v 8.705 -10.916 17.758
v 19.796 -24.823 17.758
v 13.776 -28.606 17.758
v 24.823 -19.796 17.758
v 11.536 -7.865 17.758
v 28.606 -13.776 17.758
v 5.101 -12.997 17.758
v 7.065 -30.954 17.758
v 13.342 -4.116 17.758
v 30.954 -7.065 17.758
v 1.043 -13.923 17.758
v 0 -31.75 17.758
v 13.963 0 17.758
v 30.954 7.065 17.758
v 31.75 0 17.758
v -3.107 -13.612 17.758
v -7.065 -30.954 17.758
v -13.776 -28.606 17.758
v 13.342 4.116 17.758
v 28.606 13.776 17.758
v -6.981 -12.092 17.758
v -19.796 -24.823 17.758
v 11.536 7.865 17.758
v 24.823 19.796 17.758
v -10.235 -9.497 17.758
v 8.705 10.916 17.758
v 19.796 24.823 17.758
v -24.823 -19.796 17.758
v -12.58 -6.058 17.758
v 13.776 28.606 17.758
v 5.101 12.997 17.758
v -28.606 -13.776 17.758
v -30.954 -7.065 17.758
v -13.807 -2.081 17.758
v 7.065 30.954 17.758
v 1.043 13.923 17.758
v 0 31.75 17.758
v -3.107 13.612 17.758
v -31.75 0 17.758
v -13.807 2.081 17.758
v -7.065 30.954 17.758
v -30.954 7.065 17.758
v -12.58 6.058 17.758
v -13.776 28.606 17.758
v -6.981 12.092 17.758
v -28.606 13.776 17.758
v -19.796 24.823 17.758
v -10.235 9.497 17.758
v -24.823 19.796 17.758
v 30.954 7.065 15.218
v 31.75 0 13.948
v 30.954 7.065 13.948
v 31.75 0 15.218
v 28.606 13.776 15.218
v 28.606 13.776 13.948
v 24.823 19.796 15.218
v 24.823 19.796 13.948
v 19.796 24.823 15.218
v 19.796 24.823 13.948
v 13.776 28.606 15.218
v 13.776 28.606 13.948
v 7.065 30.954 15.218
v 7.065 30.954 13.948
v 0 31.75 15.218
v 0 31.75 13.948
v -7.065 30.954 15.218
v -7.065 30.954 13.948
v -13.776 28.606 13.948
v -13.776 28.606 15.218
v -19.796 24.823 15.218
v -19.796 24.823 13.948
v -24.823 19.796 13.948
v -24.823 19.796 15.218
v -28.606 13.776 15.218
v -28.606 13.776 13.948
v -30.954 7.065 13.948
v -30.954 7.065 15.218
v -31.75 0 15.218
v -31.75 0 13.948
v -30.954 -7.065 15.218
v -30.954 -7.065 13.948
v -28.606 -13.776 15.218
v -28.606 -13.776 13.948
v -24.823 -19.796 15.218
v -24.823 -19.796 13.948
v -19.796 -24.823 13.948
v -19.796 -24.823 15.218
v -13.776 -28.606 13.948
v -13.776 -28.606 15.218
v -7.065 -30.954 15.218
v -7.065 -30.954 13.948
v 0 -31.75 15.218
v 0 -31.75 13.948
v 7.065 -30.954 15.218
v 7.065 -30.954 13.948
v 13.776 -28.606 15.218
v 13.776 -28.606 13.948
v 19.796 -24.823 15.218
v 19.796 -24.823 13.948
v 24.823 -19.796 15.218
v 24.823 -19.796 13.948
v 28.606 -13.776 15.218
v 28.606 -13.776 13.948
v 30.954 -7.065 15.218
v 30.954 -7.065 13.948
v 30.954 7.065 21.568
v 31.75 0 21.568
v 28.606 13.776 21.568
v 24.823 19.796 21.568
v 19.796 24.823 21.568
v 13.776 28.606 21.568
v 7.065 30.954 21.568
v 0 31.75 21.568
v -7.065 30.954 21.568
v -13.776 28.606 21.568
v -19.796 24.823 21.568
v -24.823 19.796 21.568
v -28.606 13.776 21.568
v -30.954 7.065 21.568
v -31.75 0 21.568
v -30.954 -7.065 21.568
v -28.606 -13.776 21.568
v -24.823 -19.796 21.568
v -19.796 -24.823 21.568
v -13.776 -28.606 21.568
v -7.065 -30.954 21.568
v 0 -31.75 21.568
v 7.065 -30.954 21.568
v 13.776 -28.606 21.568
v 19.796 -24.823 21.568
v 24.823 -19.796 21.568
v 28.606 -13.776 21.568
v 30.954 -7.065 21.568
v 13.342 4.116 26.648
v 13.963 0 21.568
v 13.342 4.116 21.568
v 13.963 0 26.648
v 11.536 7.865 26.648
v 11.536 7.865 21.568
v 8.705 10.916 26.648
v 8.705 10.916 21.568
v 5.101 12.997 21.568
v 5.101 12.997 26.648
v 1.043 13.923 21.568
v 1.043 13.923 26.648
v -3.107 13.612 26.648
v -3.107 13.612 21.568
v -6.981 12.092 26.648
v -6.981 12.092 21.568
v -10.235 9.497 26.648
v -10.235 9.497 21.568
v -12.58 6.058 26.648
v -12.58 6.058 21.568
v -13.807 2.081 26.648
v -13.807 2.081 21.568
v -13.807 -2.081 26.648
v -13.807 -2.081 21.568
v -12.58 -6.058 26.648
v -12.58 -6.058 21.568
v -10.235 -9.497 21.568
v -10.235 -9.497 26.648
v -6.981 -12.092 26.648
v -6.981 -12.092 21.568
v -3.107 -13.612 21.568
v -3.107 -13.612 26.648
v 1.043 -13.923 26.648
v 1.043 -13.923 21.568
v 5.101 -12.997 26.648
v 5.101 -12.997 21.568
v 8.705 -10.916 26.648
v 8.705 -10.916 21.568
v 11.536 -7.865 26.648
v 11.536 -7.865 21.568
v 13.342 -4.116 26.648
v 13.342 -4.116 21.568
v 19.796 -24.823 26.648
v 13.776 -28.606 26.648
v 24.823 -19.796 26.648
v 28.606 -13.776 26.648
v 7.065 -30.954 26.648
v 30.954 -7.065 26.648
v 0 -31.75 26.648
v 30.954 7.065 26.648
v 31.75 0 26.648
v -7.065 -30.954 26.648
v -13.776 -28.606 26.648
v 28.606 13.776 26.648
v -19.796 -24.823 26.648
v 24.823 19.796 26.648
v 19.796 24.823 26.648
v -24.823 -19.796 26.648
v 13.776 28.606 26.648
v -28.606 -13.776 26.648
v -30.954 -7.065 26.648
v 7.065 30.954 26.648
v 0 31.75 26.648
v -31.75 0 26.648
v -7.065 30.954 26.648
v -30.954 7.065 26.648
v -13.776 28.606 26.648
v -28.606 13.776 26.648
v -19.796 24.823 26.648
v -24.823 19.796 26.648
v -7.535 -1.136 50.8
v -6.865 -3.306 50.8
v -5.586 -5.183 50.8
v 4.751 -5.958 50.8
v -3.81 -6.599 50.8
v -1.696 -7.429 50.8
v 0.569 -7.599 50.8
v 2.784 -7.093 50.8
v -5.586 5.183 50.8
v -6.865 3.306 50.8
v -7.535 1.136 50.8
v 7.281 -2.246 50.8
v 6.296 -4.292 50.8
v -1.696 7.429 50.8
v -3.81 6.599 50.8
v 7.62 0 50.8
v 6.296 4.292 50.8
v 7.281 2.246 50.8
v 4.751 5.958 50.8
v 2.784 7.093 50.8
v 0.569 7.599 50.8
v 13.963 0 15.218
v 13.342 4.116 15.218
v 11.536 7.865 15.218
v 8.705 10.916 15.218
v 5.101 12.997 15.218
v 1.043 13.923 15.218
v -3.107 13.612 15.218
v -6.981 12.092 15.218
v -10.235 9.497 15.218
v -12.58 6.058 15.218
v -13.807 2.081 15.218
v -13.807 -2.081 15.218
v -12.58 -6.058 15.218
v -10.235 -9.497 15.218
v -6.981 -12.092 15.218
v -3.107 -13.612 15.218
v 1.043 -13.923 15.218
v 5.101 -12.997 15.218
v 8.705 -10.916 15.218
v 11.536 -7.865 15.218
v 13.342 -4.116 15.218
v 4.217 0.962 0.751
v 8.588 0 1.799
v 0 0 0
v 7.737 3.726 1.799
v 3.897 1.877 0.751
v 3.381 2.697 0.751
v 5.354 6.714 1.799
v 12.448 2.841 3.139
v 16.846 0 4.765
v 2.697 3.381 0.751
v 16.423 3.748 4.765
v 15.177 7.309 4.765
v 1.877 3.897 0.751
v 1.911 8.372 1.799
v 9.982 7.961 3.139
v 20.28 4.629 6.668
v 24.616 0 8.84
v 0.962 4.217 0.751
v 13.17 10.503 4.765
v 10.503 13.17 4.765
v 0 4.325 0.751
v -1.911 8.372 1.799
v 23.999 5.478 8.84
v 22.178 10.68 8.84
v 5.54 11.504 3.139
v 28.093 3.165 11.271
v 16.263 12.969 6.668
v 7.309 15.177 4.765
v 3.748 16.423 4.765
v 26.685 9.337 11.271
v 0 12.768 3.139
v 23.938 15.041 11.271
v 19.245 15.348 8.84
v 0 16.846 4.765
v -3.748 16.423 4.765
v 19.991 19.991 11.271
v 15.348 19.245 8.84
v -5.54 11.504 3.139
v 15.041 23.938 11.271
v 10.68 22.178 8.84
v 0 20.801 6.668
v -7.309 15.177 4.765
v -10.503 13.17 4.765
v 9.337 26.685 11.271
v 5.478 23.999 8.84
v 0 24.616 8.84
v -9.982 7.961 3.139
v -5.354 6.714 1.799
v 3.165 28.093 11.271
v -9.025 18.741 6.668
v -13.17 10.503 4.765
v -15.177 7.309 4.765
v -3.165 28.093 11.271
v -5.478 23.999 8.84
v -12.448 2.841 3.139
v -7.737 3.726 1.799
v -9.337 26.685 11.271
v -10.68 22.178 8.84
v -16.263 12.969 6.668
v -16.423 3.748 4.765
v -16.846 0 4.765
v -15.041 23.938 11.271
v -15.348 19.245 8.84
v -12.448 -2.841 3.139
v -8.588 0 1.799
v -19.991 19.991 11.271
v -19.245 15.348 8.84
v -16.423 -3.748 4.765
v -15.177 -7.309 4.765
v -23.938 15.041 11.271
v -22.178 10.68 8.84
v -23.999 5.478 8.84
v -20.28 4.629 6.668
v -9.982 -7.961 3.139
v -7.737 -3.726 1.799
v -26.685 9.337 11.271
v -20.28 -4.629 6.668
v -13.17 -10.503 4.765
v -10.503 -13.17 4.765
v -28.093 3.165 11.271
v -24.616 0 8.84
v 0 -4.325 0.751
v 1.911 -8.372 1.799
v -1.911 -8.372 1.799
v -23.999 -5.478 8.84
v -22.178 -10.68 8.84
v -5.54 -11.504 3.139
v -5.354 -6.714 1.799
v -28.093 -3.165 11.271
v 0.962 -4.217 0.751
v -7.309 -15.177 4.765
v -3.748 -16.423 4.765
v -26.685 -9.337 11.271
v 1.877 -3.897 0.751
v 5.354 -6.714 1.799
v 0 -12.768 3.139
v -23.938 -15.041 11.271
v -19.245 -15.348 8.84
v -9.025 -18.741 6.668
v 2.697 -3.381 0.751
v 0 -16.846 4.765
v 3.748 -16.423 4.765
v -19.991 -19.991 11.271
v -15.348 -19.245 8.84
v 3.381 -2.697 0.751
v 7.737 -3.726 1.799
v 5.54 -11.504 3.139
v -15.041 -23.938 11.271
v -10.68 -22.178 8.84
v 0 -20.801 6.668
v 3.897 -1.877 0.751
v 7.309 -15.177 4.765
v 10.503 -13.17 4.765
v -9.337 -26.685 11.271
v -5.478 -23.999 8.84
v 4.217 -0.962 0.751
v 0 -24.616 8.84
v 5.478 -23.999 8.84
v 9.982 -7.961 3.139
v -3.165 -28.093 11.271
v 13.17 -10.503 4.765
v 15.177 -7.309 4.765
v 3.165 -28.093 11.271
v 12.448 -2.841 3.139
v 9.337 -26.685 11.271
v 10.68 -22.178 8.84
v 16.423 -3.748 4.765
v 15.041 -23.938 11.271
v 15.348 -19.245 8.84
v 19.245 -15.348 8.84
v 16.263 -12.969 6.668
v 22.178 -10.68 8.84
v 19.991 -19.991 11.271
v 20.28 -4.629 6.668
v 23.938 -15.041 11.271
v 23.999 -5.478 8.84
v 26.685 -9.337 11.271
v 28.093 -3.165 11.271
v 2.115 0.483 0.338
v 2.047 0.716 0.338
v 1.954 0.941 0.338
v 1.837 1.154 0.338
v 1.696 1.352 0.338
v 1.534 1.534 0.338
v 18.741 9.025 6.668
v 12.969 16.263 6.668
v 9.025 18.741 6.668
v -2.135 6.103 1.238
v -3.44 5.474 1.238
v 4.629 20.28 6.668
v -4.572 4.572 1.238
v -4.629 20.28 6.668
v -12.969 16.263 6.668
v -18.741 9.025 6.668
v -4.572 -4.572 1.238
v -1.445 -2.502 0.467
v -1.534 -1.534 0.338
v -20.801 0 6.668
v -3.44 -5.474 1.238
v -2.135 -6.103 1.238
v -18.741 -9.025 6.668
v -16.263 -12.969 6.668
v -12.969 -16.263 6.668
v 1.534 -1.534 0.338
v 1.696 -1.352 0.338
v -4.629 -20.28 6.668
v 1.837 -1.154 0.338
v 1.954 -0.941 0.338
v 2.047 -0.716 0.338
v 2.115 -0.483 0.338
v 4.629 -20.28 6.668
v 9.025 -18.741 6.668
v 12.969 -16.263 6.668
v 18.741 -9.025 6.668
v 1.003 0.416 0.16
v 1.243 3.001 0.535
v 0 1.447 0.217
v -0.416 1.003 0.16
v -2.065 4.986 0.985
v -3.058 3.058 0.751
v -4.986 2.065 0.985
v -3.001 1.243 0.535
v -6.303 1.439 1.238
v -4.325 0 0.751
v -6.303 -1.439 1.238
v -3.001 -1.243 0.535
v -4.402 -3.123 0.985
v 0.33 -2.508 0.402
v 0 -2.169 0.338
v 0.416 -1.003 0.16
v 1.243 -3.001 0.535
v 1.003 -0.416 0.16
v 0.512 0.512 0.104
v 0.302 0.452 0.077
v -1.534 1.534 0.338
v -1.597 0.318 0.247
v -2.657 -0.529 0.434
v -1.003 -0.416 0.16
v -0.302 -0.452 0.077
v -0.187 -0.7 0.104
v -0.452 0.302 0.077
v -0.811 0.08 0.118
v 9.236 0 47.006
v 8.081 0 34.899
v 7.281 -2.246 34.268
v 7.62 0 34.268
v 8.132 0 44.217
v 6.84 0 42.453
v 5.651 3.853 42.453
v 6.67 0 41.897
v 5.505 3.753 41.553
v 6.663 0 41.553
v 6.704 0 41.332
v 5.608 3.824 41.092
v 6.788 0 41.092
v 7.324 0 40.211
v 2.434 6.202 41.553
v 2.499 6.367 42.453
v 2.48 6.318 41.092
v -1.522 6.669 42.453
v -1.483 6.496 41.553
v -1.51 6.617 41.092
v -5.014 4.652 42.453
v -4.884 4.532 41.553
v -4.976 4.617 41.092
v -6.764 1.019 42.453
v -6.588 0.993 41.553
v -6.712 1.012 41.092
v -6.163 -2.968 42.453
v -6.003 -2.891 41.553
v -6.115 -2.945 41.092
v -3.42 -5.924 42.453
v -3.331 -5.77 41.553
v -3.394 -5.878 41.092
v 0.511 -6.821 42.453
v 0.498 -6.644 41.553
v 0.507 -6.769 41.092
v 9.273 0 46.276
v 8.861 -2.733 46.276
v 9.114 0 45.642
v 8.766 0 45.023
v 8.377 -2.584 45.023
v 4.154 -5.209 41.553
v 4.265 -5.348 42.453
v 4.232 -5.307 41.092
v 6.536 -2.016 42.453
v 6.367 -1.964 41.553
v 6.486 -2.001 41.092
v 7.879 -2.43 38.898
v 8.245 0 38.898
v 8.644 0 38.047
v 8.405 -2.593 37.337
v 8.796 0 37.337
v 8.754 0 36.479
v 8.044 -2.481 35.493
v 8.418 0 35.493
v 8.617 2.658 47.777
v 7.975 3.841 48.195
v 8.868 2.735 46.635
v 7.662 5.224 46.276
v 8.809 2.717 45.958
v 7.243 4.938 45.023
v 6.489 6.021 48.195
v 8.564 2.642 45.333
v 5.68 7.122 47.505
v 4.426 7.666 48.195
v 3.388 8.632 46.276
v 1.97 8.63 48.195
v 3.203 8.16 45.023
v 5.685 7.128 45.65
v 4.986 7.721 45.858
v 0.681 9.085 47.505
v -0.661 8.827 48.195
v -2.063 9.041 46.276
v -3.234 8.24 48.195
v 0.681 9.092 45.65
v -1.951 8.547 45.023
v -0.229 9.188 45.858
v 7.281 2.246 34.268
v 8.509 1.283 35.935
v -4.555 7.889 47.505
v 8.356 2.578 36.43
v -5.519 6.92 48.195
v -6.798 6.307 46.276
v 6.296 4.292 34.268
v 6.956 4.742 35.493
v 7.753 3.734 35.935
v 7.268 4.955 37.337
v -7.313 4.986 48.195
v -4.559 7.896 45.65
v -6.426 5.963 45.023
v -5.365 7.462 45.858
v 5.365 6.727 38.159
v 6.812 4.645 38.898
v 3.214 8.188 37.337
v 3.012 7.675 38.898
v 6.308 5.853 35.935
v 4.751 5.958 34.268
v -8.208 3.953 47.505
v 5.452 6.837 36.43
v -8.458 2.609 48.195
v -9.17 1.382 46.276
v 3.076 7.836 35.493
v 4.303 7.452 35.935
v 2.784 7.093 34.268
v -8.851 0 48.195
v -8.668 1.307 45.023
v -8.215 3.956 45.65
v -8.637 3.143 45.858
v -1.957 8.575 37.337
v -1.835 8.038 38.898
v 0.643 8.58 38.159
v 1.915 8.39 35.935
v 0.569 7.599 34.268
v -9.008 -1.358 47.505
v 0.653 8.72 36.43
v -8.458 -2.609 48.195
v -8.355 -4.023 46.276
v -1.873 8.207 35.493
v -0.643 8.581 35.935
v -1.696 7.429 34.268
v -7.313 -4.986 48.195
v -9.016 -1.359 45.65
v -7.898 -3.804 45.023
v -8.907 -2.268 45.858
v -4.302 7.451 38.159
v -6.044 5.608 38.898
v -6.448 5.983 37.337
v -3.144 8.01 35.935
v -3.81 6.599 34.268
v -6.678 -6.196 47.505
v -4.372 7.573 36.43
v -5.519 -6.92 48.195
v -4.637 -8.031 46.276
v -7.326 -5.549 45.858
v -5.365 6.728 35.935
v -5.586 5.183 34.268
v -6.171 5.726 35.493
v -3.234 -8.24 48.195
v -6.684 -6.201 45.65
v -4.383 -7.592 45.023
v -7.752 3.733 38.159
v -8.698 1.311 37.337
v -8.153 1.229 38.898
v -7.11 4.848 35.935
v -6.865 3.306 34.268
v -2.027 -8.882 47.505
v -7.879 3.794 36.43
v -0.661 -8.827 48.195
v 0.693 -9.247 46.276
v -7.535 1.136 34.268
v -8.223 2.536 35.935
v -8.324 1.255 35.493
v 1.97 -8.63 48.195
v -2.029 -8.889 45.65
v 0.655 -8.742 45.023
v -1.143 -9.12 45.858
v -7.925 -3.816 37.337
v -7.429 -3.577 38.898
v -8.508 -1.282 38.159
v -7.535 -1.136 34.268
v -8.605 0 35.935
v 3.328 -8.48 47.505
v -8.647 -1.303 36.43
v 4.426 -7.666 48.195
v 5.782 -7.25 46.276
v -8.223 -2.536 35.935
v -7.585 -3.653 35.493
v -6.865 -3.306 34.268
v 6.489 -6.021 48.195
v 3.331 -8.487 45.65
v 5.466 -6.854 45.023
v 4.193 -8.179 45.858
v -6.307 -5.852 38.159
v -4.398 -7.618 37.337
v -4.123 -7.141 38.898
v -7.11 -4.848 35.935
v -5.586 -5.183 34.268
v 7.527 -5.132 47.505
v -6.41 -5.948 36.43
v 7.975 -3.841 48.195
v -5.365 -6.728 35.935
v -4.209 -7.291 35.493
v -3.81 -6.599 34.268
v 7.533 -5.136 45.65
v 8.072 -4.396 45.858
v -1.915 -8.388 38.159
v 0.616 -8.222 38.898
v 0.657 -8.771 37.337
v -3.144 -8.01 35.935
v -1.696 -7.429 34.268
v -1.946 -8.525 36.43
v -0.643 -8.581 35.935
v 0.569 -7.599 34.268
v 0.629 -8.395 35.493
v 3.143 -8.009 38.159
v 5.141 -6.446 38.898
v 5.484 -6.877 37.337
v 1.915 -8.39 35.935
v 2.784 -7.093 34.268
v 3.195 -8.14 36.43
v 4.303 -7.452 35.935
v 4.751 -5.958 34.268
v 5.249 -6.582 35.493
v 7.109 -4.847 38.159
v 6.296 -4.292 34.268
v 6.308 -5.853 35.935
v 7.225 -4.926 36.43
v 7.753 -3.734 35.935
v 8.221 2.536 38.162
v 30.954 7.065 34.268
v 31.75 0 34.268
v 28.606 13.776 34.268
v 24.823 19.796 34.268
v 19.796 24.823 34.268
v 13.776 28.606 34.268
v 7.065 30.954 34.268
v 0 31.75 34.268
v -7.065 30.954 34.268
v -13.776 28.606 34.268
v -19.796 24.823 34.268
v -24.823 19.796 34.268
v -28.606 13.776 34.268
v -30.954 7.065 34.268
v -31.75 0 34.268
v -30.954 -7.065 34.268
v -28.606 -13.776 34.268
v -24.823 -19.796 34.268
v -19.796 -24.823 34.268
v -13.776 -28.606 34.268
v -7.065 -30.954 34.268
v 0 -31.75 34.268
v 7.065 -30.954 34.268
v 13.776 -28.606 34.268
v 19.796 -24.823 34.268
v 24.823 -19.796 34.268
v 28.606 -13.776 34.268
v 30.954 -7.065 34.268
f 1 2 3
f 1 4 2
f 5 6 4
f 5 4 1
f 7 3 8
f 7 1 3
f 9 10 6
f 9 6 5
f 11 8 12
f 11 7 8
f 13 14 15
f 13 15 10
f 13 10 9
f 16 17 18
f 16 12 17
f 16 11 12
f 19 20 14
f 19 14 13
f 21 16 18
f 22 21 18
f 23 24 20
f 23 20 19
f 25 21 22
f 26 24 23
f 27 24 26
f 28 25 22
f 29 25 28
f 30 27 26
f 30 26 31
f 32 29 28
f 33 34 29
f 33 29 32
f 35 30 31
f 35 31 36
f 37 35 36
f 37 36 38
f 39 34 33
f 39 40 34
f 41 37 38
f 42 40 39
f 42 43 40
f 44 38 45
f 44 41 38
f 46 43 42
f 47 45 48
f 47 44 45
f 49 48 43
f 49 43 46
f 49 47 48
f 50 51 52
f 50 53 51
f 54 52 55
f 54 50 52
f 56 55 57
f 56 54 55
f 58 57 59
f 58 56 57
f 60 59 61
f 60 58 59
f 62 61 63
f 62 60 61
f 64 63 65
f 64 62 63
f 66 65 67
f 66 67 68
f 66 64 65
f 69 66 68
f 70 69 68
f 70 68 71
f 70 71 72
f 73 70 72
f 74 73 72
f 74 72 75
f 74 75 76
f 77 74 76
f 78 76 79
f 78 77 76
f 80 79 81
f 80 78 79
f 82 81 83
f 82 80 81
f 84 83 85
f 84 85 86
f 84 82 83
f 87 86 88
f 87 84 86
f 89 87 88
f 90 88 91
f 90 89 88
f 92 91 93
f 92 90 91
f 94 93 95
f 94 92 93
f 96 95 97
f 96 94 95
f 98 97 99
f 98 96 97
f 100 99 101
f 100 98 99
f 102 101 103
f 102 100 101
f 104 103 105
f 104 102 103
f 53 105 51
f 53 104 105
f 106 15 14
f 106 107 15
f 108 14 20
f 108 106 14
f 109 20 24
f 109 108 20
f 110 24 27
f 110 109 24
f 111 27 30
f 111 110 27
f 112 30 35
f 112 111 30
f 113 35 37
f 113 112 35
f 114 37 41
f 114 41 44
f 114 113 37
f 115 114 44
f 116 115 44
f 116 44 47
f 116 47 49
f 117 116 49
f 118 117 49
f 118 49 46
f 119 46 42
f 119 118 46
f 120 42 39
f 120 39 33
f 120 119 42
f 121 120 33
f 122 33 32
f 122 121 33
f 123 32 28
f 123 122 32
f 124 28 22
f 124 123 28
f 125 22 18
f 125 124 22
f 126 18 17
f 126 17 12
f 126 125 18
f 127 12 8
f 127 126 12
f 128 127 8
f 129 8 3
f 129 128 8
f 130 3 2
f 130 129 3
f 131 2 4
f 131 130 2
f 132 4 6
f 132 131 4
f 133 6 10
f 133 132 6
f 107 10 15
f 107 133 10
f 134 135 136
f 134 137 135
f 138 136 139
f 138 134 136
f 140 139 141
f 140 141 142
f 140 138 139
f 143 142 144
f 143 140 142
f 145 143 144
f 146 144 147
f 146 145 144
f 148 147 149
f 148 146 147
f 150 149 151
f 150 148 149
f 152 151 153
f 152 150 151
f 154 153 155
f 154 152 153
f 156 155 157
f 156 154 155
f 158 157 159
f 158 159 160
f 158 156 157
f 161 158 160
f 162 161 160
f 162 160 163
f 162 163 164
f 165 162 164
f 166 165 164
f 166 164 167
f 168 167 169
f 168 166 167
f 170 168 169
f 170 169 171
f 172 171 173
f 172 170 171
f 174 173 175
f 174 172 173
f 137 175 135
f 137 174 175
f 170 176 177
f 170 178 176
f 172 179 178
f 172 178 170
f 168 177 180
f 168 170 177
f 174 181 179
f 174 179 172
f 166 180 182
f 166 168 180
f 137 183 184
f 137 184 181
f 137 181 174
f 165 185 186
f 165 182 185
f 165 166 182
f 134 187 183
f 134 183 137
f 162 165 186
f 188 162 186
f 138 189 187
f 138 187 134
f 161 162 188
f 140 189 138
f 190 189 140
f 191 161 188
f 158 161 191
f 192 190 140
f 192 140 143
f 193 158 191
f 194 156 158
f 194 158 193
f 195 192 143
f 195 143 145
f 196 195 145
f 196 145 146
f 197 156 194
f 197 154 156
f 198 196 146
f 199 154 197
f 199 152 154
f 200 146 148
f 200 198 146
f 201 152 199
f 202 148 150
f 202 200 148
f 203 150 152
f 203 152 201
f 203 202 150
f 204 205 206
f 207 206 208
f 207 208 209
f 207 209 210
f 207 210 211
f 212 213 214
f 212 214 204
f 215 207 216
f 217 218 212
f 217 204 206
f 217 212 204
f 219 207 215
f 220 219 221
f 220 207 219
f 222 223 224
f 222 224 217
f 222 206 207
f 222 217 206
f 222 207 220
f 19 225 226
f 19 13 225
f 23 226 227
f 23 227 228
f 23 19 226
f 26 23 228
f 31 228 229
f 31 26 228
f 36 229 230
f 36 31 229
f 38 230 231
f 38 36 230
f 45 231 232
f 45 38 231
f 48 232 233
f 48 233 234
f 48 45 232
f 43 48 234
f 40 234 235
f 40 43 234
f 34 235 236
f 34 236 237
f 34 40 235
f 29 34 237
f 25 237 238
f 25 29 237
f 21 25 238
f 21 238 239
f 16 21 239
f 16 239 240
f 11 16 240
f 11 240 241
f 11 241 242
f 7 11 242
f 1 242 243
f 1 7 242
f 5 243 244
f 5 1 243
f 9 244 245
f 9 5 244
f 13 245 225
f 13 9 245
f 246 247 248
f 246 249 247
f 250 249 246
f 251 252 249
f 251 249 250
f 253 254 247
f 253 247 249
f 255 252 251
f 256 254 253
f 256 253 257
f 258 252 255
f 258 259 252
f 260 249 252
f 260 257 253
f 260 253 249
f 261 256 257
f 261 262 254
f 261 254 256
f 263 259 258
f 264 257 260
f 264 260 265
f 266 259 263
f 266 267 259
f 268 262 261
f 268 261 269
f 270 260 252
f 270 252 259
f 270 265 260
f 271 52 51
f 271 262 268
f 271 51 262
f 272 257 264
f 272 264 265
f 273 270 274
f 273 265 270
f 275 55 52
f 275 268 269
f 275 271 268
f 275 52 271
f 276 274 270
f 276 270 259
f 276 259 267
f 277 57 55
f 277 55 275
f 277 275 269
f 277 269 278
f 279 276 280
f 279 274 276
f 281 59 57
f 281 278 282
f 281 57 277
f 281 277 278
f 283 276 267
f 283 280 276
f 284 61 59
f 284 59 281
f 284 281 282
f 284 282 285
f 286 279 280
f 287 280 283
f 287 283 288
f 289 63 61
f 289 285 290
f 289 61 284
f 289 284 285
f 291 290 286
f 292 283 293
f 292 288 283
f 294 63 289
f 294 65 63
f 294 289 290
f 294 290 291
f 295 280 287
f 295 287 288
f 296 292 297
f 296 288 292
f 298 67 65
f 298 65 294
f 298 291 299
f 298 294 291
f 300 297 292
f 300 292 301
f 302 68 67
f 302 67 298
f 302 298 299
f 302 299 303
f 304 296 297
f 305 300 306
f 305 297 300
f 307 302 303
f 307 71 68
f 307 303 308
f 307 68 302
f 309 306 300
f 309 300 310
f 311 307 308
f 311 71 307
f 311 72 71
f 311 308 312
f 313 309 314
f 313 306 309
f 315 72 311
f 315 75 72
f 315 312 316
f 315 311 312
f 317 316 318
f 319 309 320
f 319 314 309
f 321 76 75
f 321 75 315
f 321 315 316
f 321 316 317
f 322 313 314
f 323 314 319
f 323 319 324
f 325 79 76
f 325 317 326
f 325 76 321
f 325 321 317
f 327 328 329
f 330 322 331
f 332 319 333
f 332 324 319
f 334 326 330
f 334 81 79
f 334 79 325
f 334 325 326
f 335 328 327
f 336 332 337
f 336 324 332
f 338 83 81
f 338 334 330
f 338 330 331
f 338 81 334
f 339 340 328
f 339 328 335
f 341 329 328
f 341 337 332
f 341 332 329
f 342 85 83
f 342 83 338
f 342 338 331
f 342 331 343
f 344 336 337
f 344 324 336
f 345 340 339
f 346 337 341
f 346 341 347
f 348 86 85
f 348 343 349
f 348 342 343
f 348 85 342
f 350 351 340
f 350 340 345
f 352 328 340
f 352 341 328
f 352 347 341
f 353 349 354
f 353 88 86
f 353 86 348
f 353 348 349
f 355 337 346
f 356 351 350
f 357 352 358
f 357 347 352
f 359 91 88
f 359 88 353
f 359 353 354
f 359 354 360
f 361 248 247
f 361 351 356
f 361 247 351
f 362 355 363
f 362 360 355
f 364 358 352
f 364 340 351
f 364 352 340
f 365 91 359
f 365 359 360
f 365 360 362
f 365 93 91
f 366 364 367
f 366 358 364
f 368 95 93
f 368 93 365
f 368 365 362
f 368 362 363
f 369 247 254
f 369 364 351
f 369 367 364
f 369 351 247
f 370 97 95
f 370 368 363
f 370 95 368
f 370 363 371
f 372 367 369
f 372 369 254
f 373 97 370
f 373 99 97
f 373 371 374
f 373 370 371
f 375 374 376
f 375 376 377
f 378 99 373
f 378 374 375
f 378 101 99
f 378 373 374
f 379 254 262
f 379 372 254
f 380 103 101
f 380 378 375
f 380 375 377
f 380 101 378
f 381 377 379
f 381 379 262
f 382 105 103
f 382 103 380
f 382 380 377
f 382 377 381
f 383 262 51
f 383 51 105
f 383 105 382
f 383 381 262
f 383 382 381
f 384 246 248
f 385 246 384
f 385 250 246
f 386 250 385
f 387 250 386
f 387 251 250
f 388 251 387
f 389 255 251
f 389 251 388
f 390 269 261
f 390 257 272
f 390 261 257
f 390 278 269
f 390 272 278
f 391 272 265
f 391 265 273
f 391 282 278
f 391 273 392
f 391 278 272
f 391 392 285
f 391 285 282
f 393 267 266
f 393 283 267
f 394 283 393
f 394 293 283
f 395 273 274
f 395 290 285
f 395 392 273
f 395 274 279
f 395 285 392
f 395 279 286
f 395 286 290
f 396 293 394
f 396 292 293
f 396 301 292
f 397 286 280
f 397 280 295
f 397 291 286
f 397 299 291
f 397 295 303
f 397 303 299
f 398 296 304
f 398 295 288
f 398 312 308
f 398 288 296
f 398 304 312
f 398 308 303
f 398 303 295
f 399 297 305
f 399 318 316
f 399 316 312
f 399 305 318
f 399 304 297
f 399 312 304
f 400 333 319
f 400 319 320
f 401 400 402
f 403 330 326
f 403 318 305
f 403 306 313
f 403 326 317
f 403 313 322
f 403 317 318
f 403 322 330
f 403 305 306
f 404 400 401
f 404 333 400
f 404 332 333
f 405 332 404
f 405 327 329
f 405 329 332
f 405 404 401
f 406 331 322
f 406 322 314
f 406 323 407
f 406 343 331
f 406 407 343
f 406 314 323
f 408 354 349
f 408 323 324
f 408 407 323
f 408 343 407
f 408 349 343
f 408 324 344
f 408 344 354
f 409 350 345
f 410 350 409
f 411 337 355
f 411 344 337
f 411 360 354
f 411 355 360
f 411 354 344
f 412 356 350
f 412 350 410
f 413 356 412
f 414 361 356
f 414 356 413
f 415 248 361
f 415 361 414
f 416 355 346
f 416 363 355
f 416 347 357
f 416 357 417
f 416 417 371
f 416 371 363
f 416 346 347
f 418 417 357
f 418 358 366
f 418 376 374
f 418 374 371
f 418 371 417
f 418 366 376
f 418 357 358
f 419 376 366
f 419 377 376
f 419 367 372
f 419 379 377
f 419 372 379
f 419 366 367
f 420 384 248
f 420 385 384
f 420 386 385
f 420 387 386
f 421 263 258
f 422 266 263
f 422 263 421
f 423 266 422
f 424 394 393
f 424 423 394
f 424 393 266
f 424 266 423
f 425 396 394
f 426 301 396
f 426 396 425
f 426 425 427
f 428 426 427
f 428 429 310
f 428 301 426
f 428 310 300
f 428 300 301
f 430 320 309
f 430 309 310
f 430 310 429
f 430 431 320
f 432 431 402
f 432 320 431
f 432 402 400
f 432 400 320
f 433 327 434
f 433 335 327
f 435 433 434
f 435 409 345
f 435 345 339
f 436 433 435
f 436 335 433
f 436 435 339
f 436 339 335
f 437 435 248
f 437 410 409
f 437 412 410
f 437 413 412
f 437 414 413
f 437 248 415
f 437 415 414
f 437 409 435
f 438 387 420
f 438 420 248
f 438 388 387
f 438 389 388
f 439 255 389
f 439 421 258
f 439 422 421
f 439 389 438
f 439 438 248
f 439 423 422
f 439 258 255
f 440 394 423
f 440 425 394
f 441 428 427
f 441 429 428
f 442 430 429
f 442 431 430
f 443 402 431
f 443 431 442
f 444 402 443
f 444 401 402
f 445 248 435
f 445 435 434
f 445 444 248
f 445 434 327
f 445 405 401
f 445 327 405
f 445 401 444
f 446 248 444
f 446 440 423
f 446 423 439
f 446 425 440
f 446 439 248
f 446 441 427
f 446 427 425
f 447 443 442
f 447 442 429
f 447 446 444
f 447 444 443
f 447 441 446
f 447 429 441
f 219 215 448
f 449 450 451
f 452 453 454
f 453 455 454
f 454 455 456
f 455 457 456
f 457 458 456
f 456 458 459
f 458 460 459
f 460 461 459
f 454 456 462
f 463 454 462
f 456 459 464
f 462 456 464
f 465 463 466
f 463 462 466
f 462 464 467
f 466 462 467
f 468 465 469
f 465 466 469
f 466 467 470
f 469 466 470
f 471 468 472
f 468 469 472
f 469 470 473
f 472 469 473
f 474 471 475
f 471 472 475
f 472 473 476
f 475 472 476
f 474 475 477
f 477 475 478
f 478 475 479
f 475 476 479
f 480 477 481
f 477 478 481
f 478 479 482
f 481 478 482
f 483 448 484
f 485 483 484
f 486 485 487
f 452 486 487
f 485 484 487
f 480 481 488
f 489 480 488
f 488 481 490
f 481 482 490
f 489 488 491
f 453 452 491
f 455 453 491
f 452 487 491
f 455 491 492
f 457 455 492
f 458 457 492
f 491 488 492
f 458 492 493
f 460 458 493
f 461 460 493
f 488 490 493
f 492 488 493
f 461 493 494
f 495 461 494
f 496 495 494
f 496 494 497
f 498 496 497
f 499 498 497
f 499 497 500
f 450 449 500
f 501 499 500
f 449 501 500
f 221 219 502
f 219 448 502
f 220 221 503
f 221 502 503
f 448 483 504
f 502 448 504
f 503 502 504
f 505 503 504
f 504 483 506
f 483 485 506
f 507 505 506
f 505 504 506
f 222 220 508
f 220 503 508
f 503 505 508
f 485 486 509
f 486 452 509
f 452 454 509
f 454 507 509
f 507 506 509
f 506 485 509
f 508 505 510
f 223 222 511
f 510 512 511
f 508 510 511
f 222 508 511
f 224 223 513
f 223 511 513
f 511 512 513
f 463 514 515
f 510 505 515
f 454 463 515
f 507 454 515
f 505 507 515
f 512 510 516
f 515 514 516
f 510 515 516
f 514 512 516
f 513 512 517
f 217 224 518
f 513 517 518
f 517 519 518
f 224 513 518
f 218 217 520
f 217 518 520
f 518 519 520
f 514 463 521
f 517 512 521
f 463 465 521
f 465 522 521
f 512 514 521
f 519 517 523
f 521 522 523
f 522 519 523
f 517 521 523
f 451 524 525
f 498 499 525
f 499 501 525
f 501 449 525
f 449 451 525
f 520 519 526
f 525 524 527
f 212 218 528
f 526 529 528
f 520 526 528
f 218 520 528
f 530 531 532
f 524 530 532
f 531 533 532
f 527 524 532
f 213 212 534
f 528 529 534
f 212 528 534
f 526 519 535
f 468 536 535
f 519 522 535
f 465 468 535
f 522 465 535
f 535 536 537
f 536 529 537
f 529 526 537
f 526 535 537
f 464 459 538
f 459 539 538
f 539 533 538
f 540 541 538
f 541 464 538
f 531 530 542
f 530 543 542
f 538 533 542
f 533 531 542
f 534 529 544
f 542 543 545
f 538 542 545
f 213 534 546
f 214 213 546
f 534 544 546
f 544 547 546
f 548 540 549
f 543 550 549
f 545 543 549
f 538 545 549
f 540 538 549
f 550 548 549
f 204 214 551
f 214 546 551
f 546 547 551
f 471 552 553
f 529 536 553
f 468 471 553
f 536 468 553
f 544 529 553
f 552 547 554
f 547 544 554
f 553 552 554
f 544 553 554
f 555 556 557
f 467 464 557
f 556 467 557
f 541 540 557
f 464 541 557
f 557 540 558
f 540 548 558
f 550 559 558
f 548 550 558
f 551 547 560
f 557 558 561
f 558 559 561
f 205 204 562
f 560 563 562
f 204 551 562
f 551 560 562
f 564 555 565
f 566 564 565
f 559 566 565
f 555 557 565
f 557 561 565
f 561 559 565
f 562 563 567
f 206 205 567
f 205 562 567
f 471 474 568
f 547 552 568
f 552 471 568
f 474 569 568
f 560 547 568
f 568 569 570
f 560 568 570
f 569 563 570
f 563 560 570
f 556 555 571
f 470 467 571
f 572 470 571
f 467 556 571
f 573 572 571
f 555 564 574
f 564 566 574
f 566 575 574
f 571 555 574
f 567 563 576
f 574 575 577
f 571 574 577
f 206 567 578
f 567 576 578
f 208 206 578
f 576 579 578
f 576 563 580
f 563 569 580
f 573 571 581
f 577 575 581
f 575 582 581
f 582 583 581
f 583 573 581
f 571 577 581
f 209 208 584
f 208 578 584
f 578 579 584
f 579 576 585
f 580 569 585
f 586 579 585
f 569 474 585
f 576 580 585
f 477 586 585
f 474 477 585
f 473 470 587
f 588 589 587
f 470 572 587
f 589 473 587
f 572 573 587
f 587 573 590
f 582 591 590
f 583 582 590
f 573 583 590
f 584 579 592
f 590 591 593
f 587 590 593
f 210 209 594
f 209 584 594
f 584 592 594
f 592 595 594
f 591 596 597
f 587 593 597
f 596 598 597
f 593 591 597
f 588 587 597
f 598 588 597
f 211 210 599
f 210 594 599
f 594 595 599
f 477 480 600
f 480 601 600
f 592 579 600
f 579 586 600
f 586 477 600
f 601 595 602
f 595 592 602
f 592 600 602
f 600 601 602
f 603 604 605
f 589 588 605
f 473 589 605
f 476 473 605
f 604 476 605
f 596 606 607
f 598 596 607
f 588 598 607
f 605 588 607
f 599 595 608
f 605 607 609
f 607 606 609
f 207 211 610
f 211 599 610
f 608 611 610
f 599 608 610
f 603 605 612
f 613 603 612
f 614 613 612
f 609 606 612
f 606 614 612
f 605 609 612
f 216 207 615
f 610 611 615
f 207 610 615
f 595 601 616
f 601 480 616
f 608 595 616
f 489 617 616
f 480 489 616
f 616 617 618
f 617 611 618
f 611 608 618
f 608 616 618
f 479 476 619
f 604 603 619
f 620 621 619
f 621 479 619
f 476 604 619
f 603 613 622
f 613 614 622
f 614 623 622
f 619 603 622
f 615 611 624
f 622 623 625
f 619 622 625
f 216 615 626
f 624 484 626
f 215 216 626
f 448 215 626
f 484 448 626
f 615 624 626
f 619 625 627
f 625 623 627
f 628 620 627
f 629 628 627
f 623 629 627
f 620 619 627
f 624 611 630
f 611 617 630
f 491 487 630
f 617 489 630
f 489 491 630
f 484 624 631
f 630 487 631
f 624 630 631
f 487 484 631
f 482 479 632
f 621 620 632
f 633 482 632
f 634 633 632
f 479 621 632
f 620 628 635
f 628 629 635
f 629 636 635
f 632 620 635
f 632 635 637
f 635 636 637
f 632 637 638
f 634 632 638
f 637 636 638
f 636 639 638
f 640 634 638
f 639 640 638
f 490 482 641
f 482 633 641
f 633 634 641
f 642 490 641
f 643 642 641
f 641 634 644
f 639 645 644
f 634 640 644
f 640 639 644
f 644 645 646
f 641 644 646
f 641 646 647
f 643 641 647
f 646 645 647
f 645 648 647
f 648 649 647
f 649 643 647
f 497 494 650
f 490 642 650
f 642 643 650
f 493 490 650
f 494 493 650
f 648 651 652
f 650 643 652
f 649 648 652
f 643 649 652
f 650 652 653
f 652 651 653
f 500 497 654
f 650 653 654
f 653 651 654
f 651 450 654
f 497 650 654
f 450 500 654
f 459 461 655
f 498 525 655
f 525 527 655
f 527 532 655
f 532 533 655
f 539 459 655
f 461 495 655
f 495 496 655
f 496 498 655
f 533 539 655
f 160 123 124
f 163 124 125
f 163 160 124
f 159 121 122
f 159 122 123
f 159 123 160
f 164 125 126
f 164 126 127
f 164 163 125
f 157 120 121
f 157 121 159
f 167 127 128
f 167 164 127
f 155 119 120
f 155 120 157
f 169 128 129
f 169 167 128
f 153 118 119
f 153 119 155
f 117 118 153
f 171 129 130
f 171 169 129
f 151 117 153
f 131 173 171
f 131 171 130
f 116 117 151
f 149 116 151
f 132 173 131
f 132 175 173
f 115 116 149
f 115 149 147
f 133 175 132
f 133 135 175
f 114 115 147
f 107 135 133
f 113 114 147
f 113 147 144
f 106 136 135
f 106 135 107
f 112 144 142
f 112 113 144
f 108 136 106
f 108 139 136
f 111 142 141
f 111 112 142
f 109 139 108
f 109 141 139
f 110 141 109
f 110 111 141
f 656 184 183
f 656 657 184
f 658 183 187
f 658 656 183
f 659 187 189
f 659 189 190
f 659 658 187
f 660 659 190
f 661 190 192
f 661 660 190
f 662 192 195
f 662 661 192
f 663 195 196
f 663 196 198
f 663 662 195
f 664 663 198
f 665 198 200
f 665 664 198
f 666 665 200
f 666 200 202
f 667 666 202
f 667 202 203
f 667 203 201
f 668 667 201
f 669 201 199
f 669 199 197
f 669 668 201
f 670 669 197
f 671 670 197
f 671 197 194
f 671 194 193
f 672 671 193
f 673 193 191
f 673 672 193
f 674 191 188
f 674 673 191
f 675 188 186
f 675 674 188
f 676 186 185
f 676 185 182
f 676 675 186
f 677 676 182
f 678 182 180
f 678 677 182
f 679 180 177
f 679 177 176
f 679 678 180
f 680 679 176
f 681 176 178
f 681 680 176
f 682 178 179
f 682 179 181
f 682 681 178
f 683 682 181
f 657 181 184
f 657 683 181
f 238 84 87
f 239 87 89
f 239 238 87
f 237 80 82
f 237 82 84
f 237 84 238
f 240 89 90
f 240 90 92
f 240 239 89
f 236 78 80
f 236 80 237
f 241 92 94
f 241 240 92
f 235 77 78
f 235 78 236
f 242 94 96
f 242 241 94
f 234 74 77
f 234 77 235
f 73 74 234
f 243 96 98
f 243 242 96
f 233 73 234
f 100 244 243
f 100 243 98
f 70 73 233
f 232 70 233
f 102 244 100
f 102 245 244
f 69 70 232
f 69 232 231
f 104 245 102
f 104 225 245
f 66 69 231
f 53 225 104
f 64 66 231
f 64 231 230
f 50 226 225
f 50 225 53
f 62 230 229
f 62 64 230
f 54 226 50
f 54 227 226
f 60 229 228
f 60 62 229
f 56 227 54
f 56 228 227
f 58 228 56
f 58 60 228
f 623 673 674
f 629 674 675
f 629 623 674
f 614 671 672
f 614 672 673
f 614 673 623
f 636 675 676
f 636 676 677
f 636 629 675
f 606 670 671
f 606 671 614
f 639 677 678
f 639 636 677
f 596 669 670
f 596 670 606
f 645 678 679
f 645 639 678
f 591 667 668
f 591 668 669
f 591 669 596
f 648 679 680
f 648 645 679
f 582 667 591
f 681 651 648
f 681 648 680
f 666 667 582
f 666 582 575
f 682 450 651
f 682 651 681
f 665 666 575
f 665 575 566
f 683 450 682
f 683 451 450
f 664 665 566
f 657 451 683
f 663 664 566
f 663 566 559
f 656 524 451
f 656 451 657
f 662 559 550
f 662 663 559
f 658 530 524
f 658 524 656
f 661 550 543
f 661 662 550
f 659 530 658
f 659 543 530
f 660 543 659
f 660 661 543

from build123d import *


with BuildPart() as f1:
    # F0 (on Front) → F1 (revolve)
    with BuildSketch(Plane.XZ):
        with BuildLine():
            Line((31.75, 17.7578248391), (31.75, 21.5678248391))
            Line((31.75, 21.5678248391), (13.9625025913, 21.5678248391))
            Line((13.9625025913, 21.5678248391), (13.9625025913, 26.6478248391))
            Line((13.9625025913, 26.6478248391), (31.75, 26.6478248391))
            Line((31.75, 26.6478248391), (31.75, 34.2678248391))
            Line((31.75, 34.2678248391), (7.62, 34.2678248391))
            add(Edge.make_bspline(
                [(7.62, 50.8), (8.7946373317, 48.2662832015), (10.5938172445, 45.6910384811), (3.9703337235, 41.1560327641), (10.6575661956, 38.0275243968), (7.62, 34.2678248391)],
                knots=[0, 0, 0, 0, 0.3247209532, 0.6256741659, 1, 1, 1, 1], degree=3))
            Line((7.62, 50.8), (0, 50.8))
            Line((0, 50.8), (0, 0))
            ThreePointArc((0, 0), (16.8455899513, 4.7645191049), (31.75, 13.9478248391))
            Line((31.75, 13.9478248391), (31.75, 15.2178248391))
            Line((31.75, 15.2178248391), (13.9625025913, 15.2178248391))
            Line((13.9625025913, 15.2178248391), (13.9625025913, 17.7578248391))
            Line((13.9625025913, 17.7578248391), (31.75, 17.7578248391))
        make_face()
    revolve(axis=Axis((0, 0, 25.4), (0, 0, 1)))


solid = f1.part
